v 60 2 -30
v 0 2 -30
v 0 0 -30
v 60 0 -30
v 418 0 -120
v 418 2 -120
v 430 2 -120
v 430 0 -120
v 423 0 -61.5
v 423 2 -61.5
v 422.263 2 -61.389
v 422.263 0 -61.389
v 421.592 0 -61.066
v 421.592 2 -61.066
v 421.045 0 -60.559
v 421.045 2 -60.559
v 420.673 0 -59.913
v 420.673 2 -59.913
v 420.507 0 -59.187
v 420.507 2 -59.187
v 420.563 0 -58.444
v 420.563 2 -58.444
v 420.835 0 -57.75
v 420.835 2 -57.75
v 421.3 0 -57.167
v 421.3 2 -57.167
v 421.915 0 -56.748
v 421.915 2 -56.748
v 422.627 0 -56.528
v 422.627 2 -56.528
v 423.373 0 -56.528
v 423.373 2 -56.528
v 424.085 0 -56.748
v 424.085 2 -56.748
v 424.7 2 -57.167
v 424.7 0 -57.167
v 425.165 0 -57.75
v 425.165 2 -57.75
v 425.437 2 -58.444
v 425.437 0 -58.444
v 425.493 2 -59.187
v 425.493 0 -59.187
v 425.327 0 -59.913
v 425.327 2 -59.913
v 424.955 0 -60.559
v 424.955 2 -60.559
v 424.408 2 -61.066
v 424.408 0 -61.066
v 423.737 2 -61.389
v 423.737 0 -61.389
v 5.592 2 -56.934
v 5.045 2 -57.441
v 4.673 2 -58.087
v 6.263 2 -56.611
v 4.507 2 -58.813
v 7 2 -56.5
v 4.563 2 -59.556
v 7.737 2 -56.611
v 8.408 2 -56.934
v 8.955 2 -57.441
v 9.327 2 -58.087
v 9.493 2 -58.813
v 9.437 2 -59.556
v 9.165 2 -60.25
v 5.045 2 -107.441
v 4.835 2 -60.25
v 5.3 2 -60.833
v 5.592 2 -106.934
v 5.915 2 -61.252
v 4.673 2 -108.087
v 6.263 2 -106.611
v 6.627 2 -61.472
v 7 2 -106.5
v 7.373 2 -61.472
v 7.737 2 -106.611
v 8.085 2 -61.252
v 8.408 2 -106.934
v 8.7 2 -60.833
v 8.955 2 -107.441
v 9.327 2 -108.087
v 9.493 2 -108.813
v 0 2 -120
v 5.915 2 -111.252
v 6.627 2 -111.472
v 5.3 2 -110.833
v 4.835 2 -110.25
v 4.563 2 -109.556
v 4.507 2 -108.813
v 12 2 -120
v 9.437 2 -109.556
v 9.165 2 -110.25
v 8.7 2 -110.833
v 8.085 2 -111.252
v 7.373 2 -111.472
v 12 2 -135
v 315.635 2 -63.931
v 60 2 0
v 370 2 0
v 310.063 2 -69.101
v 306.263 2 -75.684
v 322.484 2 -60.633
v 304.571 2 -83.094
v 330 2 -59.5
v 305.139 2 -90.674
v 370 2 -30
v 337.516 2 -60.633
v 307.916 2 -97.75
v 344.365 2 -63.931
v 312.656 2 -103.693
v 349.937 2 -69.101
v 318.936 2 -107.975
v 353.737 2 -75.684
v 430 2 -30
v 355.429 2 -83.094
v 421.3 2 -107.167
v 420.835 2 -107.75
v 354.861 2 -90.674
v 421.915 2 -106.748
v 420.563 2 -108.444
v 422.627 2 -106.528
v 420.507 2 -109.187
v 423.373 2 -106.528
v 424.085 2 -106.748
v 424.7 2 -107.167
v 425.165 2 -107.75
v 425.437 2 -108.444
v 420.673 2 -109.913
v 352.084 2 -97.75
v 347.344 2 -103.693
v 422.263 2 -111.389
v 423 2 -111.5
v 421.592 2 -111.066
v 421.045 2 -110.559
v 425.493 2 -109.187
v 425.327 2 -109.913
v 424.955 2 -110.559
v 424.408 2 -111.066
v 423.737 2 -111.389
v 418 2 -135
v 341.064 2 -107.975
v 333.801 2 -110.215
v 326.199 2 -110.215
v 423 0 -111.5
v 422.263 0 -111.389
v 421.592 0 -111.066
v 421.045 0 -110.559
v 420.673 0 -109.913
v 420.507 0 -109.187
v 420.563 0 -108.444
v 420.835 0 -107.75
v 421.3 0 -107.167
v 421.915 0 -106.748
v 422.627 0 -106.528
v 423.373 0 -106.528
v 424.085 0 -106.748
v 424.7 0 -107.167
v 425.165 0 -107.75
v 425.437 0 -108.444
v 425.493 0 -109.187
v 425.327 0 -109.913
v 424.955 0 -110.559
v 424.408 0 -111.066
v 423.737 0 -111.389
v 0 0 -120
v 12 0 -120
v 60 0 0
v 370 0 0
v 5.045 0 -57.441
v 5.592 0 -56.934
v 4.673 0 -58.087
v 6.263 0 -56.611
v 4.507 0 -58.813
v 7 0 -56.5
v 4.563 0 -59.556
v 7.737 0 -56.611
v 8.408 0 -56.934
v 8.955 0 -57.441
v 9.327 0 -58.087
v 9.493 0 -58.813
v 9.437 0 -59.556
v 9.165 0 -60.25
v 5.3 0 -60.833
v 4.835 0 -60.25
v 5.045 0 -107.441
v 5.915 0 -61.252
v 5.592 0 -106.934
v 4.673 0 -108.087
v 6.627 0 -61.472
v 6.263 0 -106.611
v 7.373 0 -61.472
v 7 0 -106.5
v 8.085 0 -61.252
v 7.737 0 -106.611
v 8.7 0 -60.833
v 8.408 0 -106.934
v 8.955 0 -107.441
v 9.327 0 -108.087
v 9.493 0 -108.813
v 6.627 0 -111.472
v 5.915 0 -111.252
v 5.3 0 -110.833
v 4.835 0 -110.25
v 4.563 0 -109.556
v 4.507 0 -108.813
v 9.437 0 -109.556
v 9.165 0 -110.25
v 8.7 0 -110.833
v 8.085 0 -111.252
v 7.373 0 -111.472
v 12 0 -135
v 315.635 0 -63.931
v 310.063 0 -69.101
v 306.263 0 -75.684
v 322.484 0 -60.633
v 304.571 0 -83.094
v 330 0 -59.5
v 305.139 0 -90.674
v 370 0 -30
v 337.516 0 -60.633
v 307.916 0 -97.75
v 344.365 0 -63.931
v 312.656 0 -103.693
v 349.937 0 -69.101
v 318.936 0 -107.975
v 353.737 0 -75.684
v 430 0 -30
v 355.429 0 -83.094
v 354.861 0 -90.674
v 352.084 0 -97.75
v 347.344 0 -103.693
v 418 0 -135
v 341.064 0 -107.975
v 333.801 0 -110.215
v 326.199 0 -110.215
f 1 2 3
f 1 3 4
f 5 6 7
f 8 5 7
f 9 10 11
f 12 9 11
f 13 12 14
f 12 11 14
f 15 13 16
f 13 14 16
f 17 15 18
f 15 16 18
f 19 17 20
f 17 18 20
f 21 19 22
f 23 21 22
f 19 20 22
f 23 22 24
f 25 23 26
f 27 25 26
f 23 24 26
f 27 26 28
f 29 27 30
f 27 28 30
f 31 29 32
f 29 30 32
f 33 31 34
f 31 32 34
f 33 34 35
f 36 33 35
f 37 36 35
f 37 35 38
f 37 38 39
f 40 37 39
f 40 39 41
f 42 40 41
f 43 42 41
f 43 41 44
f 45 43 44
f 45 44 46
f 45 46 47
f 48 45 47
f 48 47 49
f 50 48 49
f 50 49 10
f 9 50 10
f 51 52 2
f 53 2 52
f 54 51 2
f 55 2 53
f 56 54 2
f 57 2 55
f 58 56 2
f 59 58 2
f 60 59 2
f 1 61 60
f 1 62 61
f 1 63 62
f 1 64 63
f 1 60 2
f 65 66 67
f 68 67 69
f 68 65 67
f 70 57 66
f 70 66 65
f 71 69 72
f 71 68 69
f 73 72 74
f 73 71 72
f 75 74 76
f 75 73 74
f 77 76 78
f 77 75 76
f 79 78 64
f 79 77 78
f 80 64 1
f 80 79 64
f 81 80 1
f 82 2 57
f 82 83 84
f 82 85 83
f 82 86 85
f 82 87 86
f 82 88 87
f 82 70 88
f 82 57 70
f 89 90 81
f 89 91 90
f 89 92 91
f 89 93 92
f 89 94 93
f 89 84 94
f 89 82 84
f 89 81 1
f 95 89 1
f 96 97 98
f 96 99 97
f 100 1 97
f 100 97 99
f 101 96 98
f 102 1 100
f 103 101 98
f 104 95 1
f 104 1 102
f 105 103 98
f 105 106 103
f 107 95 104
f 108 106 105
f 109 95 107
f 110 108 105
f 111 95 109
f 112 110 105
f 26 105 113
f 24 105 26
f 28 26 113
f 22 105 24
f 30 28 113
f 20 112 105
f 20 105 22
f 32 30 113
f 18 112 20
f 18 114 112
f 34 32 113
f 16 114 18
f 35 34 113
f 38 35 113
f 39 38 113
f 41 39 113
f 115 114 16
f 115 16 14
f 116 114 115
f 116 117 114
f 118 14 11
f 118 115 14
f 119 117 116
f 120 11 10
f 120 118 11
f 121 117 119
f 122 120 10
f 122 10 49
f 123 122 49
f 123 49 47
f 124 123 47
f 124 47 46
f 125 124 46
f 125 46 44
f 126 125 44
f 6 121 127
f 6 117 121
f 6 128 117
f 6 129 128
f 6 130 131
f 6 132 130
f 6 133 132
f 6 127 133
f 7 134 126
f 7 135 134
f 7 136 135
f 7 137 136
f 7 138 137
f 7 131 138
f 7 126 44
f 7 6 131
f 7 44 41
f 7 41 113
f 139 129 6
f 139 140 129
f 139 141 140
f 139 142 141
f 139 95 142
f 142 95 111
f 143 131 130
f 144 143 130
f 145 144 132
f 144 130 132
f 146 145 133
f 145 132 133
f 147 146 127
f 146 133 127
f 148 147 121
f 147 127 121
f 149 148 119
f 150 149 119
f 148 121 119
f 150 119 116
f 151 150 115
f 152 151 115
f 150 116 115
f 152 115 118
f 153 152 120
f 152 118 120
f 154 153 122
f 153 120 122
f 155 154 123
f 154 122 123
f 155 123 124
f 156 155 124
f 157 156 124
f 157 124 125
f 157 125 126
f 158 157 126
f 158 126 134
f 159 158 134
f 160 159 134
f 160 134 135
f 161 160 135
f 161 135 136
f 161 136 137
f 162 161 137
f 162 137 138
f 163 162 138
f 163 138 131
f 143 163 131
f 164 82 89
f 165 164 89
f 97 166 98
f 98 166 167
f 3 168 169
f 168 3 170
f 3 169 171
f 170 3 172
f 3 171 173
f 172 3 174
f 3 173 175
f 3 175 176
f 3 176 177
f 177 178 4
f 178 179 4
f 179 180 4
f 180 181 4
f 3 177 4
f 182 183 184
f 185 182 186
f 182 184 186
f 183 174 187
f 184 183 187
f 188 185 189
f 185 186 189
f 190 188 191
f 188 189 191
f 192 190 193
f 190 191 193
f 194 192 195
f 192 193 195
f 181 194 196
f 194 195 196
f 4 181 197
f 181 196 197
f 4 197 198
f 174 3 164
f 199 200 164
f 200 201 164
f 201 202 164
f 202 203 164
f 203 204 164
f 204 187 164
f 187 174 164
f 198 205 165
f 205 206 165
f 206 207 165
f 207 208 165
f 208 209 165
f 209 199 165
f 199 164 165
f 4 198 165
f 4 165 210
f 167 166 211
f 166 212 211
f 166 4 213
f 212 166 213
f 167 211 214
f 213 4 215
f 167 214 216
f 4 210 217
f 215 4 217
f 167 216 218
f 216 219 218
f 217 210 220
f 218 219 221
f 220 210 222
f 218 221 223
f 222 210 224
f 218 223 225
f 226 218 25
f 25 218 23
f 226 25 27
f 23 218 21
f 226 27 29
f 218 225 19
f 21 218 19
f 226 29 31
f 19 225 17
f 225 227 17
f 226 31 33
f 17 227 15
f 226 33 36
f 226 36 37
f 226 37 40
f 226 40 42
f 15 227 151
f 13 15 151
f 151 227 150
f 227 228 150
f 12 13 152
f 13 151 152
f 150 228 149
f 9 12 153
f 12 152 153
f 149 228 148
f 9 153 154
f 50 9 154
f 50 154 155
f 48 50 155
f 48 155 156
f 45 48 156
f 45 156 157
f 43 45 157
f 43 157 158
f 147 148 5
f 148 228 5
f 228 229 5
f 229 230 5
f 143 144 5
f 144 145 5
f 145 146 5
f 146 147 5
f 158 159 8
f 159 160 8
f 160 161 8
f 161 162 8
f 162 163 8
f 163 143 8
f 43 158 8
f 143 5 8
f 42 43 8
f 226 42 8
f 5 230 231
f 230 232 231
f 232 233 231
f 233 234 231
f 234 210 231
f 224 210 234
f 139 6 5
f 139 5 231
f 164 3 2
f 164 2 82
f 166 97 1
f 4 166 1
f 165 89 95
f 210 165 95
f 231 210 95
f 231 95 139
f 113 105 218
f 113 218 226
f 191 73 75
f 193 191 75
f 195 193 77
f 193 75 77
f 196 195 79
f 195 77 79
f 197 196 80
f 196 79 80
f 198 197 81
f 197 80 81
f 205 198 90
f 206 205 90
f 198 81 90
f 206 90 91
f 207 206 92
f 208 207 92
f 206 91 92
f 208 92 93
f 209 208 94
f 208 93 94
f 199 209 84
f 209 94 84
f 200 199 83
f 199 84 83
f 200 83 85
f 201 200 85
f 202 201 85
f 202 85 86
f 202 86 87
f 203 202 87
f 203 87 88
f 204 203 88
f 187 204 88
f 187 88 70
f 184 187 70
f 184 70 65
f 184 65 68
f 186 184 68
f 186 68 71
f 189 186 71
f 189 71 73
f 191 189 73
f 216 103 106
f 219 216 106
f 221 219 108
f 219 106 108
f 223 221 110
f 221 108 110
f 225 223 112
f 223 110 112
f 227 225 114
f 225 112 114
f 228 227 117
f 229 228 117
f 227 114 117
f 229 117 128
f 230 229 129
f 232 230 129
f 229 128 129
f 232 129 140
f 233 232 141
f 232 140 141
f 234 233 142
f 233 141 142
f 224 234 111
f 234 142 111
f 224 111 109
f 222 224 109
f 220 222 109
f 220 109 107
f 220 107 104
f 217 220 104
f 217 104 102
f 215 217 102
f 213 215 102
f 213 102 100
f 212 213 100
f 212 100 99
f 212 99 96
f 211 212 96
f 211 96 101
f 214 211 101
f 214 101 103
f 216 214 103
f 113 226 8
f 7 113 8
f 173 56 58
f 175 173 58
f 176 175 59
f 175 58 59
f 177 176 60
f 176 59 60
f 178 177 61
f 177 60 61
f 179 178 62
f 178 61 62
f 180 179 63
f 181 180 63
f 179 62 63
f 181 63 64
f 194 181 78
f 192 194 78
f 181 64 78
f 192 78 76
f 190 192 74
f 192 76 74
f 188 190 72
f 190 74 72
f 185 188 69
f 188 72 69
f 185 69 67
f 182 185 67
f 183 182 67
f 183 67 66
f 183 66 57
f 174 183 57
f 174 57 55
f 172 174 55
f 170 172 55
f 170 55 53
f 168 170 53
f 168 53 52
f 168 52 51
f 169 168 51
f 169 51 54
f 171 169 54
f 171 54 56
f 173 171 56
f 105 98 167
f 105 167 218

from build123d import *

# Parameters (mm, degrees)
SKETCH_2_W          = 430
SKETCH_2_H          = 135
EXTRUDE_1_DEPTH     = 2
SKETCH_3_R          = 2.5
SKETCH_3_W          = 12
SKETCH_3_H          = 15
SKETCH_3_W_2        = 60
SKETCH_3_H_2        = 30
CUT_EXTRUDE_1_DEPTH = 451.698347013
SKETCH_4_R          = 25.5
CUT_EXTRUDE_2_DEPTH = 451.698347013


with BuildPart() as part:
    # Эскиз2 → Бобышка-Вытянуть1 (new body)
    with BuildSketch(Plane(origin=(0, 0, 0), x_dir=(1, 0, 0), z_dir=(0, 1, 0))):
        with Locations((215, 67.5)):
            Rectangle(SKETCH_2_W, SKETCH_2_H)
    extrude(amount=EXTRUDE_1_DEPTH)

    # Эскиз3 → Вырез-Вытянуть1 (cut, through all)
    with BuildSketch(Plane(origin=(0, 2, 0), x_dir=(1, 0, 0), z_dir=(0, 1, 0))):
        with Locations(Location((7, 109, 0), (0, 0, 270))):
            Circle(SKETCH_3_R)
        with Locations(Location((423, 109, 0), (0, 0, 90))):
            Circle(SKETCH_3_R)
        with Locations(Location((7, 59, 0), (0, 0, 270))):
            Circle(SKETCH_3_R)
        with Locations(Location((423, 59, 0), (0, 0, 90))):
            Circle(SKETCH_3_R)
        with Locations((424, 127.5)):
            Rectangle(SKETCH_3_W, SKETCH_3_H)
        with Locations((6, 127.5)):
            Rectangle(SKETCH_3_W, SKETCH_3_H)
        with Locations((400, 15)):
            Rectangle(SKETCH_3_W_2, SKETCH_3_H_2)
        with Locations((30, 15)):
            Rectangle(SKETCH_3_W_2, SKETCH_3_H_2)
    extrude(amount=-CUT_EXTRUDE_1_DEPTH, mode=Mode.SUBTRACT)

    # Эскиз4 → Вырез-Вытянуть2 (cut, through all)
    with BuildSketch(Plane(origin=(0, 2, 0), x_dir=(1, 0, 0), z_dir=(0, 1, 0))):
        with Locations(Location((330, 85, 0), (0, 0, 270))):
            Circle(SKETCH_4_R)
    extrude(amount=-CUT_EXTRUDE_2_DEPTH, mode=Mode.SUBTRACT)


solid = part.part
